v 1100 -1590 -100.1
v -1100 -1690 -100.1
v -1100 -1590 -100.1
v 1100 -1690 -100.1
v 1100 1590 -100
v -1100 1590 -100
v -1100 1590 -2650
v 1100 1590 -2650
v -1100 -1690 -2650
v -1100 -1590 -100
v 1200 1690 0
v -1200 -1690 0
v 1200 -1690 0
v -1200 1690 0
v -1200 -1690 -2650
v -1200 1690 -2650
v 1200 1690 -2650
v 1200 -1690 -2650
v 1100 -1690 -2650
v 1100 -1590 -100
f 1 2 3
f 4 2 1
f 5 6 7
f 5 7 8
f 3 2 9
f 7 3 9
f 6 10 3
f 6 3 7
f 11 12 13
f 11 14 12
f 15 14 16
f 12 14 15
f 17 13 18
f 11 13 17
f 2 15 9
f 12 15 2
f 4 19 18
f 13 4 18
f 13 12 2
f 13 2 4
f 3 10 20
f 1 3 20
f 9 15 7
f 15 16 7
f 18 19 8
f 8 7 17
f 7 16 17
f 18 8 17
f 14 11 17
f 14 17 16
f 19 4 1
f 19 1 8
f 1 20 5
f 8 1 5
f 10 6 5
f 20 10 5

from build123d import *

# Parameters (mm, degrees)
F0_W     = 2200
F0_H     = 3280
F1_DEPTH = 100
F0_W_2   = 100
F0_H_2   = 100
F2_DEPTH = 2650
F3_W     = 2200
F3_H     = 100
F4_DEPTH = 0.1


with BuildPart() as f1:
    # F0 (on Top) → F1 (new body)
    with BuildSketch(Plane.XY):
        with Locations((0, -50)):
            Rectangle(F0_W, F0_H)
    extrude(amount=-F1_DEPTH)

    # F0 (on Top) → F2 (join)
    with BuildSketch(Plane.XY):
        with Locations((-1150, -50)):
            Rectangle(F0_W_2, F0_H)
        with Locations((0, 1640)):
            Rectangle(F0_W, F0_H_2)
        with Locations((1150, -50)):
            Rectangle(F0_W_2, F0_H)
        with Locations((1150, 1640)):
            Rectangle(F0_W_2, F0_H_2)
        with Locations((-1150, 1640)):
            Rectangle(F0_W_2, F0_H_2)
    extrude(amount=-F2_DEPTH)

    # F3 (on face) → F4 (join)
    with BuildSketch(Plane(origin=(0, 0, -100), x_dir=(1, 0, 0), z_dir=(0, 0, -1))):
        with Locations((0, 1640)):
            Rectangle(F3_W, F3_H)
    extrude(amount=F4_DEPTH)


solid = f1.part
